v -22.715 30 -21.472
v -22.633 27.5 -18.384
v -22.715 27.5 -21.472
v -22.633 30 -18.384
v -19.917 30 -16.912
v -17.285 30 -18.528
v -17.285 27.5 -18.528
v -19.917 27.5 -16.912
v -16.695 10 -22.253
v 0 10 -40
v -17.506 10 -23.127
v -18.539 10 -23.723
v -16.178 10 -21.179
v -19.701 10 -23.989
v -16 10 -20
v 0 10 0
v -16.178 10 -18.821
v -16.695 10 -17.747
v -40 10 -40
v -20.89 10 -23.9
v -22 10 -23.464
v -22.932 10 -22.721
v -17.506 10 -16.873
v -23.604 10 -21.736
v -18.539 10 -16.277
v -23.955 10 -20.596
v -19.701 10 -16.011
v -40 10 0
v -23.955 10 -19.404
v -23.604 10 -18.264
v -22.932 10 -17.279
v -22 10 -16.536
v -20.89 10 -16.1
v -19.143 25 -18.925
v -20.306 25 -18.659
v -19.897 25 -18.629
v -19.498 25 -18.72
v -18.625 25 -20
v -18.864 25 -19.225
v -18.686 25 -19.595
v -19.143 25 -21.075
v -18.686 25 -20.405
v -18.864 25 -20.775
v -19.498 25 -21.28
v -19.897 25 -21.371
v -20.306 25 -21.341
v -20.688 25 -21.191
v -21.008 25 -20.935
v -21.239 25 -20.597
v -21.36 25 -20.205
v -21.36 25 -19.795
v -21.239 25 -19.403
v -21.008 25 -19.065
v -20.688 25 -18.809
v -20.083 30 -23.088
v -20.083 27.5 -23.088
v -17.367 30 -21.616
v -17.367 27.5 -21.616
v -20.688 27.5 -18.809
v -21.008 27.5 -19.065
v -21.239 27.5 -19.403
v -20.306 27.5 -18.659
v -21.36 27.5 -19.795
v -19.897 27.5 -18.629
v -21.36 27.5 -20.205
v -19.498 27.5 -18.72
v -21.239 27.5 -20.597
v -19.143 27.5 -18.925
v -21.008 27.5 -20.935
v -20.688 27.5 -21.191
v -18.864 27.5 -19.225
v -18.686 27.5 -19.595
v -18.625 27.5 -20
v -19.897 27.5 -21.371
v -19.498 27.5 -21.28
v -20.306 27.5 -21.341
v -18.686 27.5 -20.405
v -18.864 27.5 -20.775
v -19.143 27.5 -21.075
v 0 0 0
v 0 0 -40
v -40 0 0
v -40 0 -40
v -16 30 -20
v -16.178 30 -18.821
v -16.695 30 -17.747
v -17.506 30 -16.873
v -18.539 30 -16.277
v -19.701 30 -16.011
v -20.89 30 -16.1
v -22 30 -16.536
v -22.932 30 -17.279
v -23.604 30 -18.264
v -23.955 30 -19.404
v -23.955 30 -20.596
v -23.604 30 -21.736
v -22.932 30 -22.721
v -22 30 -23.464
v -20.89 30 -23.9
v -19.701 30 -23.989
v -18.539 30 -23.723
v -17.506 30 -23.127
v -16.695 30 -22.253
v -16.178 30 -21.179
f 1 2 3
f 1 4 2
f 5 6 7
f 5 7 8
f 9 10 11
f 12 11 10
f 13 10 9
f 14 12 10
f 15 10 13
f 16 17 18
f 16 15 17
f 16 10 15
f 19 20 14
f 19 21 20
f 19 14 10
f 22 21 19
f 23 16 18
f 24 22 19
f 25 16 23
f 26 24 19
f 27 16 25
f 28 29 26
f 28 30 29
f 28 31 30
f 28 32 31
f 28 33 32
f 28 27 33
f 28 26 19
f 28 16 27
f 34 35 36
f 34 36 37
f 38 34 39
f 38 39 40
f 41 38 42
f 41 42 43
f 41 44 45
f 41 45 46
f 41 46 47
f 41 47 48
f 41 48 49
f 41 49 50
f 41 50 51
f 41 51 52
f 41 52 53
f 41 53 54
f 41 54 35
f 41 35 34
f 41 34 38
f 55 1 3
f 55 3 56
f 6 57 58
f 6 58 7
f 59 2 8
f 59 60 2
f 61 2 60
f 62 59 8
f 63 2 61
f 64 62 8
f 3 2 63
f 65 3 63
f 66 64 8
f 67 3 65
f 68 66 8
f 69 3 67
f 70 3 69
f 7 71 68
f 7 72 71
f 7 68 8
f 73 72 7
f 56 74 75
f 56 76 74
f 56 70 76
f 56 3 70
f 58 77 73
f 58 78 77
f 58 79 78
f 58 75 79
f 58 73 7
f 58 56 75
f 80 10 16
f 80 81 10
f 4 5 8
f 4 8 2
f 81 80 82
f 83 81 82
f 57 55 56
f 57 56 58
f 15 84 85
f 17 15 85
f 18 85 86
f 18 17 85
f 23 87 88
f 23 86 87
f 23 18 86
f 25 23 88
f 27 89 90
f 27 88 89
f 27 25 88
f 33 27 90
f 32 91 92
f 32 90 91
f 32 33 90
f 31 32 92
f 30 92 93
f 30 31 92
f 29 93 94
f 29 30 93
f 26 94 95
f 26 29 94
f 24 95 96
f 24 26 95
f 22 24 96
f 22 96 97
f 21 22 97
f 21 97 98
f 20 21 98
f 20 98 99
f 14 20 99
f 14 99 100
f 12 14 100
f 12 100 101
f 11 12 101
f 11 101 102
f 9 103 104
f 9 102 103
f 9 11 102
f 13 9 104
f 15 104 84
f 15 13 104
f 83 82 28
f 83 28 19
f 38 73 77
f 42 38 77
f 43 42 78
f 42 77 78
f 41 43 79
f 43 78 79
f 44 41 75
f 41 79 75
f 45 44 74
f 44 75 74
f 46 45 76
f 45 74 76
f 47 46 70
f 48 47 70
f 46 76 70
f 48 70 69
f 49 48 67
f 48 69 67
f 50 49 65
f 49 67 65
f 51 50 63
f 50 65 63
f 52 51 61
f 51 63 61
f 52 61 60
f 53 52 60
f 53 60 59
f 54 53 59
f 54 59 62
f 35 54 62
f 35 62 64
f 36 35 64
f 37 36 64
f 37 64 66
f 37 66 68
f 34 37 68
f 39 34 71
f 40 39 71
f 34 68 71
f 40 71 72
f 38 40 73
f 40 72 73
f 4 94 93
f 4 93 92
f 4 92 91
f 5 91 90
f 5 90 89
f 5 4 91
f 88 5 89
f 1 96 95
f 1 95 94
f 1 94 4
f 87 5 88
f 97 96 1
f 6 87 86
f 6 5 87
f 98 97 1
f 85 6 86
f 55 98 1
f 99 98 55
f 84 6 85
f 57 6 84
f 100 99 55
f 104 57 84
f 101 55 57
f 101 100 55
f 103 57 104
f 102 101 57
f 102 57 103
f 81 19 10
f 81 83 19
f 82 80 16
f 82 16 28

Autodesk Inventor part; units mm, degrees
ref_plane "YZ Plane" through (0, 0, 0) normal (1, 0, 0) x (0, 1, 0)
ref_plane "XZ Plane" through (0, 0, 0) normal (0, 1, 0) x (-1, 0, 0)
ref_plane "XY Plane" through (0, 0, 0) normal (0, 0, 1) x (1, 0, 0)
sketch "Sketch1" plane through (0, 0, 0) normal (0, 1, 0) x (-1, 0, 0)
  line L0 (0, 0) -> (40, 0)
  line L1 (40, 0) -> (40, -40)
  line L2 (40, -40) -> (0, -40)
  line L3 (0, -40) -> (0, 0)
  dimension "d0" = 40
  dimension "d1" = 40
extrude "Extrusion1" add sketch "Sketch1" along normal blind 10
sketch "Sketch2" plane through (0, 10, 0) normal (0, 1, 0) x (1, 0, 0)
  circle A0 centre (-20, 20) radius 4
  point P0 (0, 0)
  dimension "d4" = 8
extrude "Extrusion2" add sketch "Sketch2" along normal blind 20
sketch "Sketch3" plane through (-20, 30, -20) normal (0, 1, 0) x (1, 0, 0)
  line L0 (2.6327, 1.6155) -> (2.7154, -1.4722)
  line L1 (2.7154, -1.4722) -> (0.0827, -3.0877)
  line L2 (0.0827, -3.0877) -> (-2.6327, -1.6155)
  line L3 (-2.6327, -1.6155) -> (-2.7154, 1.4722)
  line L4 (-2.7154, 1.4722) -> (-0.0827, 3.0877)
  line L5 (-0.0827, 3.0877) -> (2.6327, 1.6155)
  point P0 (20, -20)
  point P1 (0, 0)
  dimension "d7" = 5.35
extrude "Extrusion3" cut sketch "Sketch3" against normal blind 2.5
sketch "Sketch4" plane through (-20, 27.5, -20) normal (0, 1, 0) x (1, 0, 0)
  circle A0 centre (0, 0) radius 1.375
  point P0 (20, -20)
  dimension "d10" = 2.75
extrude "Extrusion4" cut sketch "Sketch4" against normal blind 2.5
properties part number "YMount_Belt"
